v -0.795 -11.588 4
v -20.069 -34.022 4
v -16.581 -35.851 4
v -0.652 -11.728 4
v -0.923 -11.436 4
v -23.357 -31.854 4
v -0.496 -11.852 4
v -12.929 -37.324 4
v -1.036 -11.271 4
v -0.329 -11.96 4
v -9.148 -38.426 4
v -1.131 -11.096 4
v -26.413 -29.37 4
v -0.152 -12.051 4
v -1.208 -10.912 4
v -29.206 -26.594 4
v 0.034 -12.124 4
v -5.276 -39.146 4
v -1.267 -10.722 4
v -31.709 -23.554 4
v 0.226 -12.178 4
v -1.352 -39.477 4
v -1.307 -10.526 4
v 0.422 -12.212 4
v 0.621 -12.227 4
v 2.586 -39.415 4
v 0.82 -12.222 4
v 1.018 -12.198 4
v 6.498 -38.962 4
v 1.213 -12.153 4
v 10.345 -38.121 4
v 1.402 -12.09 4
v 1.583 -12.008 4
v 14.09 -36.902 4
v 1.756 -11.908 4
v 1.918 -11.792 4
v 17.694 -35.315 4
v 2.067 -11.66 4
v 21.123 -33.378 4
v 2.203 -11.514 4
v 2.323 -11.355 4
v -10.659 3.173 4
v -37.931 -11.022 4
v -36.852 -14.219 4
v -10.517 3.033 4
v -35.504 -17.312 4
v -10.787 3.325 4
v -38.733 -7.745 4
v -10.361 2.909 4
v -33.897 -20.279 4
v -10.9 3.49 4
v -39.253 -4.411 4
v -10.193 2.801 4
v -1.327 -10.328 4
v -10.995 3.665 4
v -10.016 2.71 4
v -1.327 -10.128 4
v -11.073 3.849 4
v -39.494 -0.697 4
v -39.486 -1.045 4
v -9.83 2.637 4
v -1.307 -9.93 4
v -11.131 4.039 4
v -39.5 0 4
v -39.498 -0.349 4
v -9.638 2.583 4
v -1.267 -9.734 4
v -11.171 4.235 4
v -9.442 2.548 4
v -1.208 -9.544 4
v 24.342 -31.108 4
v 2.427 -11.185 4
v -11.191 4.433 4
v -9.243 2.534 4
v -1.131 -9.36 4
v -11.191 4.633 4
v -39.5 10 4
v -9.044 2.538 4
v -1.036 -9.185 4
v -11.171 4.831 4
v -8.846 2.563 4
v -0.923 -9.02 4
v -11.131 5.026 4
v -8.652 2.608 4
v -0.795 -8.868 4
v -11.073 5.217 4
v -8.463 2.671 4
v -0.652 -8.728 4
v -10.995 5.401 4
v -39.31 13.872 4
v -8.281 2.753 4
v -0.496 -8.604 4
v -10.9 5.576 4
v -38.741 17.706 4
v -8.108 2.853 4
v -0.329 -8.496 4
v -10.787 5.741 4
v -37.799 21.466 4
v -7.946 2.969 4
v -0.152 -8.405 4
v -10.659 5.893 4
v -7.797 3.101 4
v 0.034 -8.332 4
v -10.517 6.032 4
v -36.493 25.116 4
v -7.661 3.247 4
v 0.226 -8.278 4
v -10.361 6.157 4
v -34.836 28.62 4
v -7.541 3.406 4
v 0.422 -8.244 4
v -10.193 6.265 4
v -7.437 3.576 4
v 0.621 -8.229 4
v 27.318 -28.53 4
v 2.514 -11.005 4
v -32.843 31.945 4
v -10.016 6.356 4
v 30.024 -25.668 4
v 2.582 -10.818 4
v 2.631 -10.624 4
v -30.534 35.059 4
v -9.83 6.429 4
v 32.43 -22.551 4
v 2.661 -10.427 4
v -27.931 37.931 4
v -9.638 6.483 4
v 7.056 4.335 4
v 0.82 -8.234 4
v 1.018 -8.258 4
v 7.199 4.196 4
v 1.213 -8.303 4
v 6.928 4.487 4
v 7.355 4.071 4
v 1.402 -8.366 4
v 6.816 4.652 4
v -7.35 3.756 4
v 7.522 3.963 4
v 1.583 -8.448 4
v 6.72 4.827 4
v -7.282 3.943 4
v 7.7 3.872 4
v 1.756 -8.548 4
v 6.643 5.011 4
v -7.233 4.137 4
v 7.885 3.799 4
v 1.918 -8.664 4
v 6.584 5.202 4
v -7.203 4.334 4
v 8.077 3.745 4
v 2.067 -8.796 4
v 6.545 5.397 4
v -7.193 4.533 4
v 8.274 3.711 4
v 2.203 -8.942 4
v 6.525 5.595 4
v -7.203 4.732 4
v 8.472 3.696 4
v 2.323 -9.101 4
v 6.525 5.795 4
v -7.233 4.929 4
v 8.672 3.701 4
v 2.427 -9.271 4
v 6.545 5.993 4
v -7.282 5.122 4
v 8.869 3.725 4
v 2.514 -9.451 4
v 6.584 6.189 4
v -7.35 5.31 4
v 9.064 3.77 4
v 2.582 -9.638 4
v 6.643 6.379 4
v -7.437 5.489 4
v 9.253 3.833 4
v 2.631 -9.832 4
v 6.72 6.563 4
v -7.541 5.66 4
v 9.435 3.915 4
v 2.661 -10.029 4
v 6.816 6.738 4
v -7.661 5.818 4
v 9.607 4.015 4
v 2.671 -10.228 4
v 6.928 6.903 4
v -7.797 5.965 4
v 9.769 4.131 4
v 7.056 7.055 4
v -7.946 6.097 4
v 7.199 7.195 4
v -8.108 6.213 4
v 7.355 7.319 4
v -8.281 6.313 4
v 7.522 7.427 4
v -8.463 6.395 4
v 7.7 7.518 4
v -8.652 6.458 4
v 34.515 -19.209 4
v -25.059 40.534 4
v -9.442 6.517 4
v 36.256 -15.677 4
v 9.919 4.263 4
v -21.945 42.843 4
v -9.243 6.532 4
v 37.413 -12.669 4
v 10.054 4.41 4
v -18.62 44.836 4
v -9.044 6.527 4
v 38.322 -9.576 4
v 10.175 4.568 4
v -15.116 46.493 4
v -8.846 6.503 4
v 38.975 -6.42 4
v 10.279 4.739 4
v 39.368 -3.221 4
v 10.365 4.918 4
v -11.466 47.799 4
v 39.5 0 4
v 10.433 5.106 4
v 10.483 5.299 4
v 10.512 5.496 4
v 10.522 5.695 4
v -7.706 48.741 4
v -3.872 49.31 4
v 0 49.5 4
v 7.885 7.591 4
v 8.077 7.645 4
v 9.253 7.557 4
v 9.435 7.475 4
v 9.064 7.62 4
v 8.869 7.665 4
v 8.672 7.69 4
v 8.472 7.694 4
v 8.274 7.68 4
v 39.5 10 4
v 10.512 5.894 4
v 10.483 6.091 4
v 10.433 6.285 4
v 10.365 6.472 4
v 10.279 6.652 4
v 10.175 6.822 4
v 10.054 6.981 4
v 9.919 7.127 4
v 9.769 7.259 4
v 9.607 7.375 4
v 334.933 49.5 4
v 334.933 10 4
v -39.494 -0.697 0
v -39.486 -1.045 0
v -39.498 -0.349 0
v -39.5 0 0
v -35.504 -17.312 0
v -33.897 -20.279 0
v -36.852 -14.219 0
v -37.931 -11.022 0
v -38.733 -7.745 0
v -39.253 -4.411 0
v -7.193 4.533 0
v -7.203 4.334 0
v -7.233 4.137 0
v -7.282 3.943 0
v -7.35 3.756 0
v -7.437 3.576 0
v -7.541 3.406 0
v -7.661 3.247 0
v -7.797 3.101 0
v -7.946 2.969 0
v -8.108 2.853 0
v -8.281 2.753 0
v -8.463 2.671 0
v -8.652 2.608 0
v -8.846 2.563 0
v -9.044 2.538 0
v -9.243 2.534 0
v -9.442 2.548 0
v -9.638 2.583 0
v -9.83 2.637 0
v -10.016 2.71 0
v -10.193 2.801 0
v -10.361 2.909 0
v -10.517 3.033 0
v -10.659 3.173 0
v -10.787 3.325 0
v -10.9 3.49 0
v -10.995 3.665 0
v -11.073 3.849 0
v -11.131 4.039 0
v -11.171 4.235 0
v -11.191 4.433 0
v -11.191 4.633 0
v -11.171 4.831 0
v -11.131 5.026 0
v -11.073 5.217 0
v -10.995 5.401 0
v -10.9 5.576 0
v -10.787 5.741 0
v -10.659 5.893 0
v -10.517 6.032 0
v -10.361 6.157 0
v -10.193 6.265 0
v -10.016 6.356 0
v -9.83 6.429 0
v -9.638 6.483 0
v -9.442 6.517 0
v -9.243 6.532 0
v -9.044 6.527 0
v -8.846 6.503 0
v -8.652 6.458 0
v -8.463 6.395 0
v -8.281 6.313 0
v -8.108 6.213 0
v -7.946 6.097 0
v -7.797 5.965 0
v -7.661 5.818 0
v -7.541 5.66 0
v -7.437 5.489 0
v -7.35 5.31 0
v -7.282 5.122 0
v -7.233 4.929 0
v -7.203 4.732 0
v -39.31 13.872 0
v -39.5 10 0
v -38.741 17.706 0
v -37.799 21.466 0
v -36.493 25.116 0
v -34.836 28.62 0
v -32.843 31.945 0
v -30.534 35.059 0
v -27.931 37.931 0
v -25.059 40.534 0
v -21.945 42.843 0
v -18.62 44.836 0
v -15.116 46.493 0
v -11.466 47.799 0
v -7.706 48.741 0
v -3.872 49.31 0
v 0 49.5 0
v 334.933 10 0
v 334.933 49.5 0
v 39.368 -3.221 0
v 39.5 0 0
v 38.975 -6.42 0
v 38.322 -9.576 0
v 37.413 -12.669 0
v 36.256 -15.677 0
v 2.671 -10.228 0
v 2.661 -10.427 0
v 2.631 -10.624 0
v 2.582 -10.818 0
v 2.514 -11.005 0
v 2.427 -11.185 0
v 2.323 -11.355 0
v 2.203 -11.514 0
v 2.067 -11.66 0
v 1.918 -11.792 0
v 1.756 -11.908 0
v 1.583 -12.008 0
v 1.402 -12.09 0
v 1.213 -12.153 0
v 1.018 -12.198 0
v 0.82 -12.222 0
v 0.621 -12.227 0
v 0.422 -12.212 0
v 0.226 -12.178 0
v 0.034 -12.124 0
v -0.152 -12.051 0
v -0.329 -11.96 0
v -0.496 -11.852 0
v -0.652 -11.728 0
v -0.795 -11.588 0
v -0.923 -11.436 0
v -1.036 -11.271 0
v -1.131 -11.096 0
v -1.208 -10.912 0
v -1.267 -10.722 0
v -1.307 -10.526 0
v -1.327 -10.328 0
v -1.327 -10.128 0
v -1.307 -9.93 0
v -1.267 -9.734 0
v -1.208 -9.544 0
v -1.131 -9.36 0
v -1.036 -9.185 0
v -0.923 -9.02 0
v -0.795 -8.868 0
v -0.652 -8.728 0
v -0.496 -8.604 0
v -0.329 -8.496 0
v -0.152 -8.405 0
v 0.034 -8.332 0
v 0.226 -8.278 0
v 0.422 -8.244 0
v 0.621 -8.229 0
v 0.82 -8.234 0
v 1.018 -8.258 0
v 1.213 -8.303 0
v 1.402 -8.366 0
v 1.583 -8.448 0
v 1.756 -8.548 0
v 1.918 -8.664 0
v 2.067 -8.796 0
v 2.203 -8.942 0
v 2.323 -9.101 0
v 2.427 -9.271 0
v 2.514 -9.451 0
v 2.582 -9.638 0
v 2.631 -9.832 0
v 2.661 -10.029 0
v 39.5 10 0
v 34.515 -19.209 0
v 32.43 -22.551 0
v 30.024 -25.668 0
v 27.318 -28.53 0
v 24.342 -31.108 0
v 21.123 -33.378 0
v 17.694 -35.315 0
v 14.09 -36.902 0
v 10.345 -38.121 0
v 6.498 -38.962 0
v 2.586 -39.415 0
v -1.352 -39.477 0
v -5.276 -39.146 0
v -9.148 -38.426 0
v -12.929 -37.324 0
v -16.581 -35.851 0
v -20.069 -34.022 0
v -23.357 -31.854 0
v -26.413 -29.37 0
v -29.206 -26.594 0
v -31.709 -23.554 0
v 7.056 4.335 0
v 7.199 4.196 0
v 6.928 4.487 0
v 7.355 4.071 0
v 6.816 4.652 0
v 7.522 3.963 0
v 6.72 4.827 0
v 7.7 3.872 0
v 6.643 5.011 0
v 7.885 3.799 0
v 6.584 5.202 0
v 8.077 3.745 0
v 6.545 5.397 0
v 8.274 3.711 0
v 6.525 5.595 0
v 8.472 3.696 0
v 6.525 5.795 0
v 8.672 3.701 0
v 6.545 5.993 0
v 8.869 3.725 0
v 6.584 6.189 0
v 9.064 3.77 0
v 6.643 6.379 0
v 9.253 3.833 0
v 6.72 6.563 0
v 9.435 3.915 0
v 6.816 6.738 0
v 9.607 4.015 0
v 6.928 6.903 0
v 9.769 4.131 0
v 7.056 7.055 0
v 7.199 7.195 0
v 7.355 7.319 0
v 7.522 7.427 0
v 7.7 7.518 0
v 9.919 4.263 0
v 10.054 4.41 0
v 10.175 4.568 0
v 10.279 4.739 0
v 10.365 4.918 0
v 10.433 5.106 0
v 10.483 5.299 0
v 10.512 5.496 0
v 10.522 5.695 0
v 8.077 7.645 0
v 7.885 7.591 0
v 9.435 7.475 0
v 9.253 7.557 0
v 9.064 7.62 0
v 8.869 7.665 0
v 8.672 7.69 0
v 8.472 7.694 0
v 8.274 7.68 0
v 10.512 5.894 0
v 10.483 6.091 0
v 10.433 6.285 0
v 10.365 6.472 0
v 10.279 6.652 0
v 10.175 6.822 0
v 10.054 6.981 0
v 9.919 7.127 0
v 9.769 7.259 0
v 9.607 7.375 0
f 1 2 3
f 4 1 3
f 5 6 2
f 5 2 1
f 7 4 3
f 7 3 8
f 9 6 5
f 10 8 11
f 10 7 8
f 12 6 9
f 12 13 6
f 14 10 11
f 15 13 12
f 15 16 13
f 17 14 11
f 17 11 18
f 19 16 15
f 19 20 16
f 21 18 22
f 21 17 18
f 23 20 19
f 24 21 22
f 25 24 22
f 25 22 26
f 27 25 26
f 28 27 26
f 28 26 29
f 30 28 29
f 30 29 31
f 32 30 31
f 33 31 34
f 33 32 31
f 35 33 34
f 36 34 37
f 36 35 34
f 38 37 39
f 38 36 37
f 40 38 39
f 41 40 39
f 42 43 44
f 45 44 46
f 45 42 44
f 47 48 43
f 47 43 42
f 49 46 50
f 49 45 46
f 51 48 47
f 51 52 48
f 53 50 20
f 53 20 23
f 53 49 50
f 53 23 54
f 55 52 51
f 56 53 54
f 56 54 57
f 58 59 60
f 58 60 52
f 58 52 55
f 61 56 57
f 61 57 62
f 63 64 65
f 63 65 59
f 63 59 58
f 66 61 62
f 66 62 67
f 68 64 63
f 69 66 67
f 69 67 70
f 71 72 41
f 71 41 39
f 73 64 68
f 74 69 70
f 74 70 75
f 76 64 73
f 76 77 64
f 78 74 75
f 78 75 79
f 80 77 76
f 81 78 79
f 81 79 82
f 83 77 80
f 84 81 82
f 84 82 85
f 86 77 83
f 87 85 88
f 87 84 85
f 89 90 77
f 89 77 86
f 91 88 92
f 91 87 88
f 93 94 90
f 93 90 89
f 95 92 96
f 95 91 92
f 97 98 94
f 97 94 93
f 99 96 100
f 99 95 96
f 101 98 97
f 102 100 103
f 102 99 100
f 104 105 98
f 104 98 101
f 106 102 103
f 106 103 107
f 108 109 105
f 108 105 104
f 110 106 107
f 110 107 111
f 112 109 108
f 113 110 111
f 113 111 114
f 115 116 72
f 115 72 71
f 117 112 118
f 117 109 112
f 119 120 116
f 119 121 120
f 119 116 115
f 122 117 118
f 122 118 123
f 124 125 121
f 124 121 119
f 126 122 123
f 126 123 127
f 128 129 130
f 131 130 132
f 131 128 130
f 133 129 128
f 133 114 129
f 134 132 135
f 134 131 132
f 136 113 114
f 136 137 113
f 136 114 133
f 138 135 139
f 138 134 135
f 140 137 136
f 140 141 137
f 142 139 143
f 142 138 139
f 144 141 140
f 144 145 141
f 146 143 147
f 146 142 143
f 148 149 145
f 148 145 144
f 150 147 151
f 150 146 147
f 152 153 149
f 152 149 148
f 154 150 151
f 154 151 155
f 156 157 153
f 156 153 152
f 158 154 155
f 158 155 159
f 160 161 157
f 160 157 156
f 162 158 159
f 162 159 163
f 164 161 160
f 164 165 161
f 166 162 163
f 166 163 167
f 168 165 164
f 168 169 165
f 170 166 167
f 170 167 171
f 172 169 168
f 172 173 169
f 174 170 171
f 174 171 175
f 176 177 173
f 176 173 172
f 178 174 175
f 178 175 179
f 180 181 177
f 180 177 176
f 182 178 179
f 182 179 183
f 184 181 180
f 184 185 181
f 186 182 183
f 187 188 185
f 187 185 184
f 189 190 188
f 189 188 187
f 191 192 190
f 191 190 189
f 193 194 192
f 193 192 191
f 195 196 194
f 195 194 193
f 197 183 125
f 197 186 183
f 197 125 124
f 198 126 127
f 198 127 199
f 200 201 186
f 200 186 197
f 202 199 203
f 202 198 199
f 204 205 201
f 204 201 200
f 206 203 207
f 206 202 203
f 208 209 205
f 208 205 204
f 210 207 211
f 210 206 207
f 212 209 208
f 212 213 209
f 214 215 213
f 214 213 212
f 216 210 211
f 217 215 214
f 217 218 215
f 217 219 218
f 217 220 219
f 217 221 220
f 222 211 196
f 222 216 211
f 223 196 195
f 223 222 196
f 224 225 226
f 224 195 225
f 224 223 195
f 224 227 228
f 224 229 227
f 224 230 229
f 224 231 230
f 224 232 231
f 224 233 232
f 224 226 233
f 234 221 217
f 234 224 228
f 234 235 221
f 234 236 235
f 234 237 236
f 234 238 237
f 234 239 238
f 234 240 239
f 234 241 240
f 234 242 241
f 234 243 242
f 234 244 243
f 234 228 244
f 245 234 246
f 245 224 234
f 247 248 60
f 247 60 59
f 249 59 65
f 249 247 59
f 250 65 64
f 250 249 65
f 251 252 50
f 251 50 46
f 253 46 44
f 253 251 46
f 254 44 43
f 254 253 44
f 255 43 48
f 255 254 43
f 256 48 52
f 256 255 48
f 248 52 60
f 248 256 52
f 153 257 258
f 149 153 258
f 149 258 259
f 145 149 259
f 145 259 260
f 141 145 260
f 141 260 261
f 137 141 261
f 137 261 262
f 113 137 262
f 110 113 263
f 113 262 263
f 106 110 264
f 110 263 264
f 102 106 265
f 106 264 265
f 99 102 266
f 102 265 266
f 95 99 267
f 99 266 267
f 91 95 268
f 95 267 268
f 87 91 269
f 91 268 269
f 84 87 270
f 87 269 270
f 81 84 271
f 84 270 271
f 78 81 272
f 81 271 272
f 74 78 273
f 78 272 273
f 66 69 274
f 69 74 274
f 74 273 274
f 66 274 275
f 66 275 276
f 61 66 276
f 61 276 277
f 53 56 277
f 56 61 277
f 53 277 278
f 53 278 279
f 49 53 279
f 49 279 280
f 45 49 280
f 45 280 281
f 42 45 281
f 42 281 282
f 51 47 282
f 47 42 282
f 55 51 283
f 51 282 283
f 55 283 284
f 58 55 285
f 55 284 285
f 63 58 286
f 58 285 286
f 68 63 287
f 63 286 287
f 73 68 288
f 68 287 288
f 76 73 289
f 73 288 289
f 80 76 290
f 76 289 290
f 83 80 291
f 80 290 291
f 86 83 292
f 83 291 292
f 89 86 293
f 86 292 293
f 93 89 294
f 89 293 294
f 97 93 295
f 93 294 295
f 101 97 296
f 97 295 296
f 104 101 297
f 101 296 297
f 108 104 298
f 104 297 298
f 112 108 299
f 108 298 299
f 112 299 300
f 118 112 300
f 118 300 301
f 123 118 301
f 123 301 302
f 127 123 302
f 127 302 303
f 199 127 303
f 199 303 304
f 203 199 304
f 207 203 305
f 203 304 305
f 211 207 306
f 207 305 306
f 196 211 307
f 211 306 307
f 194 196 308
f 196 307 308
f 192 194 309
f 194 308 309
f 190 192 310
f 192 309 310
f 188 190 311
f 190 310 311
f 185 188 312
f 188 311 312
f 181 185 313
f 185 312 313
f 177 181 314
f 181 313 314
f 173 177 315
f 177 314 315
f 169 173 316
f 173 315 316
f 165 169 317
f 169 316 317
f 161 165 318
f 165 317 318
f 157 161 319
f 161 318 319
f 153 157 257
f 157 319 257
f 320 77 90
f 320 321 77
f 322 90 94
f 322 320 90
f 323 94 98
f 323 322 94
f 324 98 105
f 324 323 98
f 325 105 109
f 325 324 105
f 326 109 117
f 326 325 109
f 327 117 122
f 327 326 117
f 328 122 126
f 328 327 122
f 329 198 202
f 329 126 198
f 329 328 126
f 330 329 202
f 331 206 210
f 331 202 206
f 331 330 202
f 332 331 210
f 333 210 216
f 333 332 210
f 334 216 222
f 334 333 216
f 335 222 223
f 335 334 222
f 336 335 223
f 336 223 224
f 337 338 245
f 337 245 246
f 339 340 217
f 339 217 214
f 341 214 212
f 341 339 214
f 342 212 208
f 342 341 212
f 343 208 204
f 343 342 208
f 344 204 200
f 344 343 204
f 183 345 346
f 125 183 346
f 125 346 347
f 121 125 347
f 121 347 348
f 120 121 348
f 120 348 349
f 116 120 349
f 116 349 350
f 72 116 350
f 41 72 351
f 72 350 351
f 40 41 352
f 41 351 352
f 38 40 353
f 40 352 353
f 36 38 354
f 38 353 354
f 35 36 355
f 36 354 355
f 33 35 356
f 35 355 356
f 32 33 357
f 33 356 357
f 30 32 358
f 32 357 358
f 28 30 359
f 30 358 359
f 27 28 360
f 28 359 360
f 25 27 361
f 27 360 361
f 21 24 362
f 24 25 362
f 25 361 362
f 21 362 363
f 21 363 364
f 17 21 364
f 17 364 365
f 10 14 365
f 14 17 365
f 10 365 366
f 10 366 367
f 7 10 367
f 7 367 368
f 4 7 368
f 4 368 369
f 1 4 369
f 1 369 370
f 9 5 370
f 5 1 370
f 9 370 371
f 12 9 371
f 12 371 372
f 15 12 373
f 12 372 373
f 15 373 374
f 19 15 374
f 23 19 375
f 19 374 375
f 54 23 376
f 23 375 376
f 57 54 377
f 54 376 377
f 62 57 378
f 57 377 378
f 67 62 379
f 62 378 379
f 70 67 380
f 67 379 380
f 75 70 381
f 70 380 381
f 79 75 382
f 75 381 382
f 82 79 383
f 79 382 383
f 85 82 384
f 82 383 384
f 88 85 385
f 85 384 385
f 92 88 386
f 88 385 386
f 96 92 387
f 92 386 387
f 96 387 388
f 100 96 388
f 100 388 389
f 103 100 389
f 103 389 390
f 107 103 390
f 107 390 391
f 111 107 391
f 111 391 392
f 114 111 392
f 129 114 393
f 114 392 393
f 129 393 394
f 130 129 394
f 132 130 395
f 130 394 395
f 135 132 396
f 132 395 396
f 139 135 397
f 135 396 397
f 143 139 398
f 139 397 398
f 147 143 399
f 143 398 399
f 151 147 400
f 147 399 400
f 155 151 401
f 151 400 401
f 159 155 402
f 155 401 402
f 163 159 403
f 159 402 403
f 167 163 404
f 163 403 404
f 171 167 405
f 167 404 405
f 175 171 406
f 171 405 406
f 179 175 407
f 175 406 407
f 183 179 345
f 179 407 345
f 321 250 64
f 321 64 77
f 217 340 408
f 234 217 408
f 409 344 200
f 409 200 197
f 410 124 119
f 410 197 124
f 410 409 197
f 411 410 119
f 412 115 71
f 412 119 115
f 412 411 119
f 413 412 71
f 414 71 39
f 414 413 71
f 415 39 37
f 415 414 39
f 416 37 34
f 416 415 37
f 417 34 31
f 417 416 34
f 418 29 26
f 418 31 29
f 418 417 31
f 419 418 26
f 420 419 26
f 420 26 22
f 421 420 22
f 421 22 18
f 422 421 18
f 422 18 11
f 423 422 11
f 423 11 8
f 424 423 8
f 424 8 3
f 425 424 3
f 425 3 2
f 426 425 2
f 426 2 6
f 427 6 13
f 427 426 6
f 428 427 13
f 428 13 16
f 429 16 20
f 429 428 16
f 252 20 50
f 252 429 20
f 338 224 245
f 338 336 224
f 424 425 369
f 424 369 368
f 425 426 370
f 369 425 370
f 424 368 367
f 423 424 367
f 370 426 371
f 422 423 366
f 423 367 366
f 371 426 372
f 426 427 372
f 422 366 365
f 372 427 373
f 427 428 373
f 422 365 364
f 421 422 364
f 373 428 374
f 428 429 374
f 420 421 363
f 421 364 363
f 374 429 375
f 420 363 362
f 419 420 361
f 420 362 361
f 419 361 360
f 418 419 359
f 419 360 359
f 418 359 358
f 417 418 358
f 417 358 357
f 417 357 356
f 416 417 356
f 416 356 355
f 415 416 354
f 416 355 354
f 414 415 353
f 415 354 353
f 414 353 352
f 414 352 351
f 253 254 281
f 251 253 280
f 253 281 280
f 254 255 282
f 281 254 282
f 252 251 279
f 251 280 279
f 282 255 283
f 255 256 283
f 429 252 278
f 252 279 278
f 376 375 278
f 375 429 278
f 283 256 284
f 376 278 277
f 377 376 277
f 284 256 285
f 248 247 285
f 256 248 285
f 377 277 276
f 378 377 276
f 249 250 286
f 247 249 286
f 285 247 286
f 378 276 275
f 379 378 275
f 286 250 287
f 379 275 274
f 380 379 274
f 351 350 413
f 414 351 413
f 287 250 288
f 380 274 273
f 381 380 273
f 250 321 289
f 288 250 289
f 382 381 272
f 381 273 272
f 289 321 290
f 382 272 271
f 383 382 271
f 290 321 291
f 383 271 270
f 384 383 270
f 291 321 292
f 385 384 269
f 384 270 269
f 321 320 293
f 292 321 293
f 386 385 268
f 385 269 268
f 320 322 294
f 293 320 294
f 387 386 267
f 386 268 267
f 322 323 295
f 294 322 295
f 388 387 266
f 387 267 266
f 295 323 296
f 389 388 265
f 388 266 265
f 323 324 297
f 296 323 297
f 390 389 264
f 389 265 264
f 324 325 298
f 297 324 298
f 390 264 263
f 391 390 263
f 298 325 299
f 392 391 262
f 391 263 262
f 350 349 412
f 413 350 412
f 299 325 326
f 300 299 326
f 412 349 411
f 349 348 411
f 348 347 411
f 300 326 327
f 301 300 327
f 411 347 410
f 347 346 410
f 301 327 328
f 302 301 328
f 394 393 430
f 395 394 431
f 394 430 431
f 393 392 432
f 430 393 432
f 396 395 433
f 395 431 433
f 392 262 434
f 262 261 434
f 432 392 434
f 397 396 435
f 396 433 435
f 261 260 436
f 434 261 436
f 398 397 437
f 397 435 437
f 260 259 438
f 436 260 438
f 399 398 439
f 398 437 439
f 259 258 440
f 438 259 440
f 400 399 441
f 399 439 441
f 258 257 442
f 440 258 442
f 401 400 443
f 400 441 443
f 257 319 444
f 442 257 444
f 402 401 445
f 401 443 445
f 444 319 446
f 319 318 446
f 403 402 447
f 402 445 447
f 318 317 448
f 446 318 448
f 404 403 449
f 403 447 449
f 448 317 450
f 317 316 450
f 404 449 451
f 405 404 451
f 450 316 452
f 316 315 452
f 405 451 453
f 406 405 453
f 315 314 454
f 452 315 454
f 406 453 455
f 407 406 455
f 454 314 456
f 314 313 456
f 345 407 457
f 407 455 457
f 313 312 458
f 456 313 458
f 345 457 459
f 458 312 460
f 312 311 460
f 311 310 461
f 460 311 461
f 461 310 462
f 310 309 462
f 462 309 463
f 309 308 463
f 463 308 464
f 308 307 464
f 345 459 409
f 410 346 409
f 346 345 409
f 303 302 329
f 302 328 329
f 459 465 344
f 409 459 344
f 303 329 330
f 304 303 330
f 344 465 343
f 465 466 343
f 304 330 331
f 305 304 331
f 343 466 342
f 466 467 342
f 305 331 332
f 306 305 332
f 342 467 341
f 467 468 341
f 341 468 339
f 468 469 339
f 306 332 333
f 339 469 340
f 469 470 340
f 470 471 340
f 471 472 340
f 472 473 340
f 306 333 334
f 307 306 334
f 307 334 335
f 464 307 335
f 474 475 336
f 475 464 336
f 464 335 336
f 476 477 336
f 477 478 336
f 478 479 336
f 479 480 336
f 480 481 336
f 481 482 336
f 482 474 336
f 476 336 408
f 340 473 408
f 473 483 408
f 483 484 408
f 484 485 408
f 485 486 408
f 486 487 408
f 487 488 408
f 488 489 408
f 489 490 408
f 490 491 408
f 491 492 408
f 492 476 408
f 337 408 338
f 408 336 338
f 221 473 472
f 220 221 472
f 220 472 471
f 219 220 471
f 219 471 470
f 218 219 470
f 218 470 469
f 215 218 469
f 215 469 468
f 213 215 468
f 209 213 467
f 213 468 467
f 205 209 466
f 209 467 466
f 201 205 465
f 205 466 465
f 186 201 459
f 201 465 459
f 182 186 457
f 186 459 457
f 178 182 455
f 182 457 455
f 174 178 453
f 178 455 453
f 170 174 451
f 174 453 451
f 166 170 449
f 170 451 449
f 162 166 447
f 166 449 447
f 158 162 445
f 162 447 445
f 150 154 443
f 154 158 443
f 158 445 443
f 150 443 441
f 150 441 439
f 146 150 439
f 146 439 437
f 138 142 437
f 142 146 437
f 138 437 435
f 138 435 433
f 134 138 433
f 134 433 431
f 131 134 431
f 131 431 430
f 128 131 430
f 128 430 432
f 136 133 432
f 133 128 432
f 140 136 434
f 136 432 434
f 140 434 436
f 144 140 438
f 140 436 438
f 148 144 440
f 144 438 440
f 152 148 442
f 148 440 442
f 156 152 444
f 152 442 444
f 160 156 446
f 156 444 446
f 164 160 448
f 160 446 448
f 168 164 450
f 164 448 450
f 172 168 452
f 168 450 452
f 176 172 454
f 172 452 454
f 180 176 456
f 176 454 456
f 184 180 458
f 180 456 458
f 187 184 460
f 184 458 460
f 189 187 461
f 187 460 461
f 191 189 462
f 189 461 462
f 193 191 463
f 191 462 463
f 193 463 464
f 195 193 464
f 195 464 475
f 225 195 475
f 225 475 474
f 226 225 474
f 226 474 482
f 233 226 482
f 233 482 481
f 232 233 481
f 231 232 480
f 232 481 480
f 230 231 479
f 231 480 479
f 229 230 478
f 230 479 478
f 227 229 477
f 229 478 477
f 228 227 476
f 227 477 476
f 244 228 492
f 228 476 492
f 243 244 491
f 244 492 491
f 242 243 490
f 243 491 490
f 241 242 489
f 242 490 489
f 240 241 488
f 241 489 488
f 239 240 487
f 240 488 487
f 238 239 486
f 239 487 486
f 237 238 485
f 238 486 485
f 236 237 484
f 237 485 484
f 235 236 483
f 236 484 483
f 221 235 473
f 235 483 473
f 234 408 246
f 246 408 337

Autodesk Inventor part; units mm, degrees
ref_plane "YZ Plane" through (0, 0, 0) normal (1, 0, 0) x (0, 1, 0)
ref_plane "XZ Plane" through (0, 0, 0) normal (0, 1, 0) x (-1, 0, 0)
ref_plane "XY Plane" through (0, 0, 0) normal (0, 0, 1) x (1, 0, 0)
sketch "Sketch1" plane through (0, 0, 0) normal (0, 0, 1) x (1, 0, 0)
  circle A0 centre (0, 0) radius 22.3333 projected
  circle A1 centre (8.5222, 5.6951) radius 2 projected
  circle A2 centre (0.671, -10.228) radius 2 projected
  circle A3 centre (-9.1932, 4.5329) radius 2 projected
  arc A4 (-33.8969, -20.2792) -> (36.2558, -15.6768) centre (0, 0) ccw projected
  arc A5 (39.2843, 4.1223) -> (-39.4862, -1.0454) centre (0, 0) ccw projected
  circle A6 centre (0, 0) radius 39.5
  line L0 (364.1325, 23.8889) -> (45.9013, 3.0114) projected
  line L1 (26.2679, 39.5) -> (334.9329, 39.5)
  line L2 (334.9329, 39.5) -> (334.9329, 0)
  line L3 (39.5, 10) -> (334.9329, 10)
  line L4 (334.9329, 10) -> (334.9329, 0)
  line L5 (334.9329, 39.5) -> (26.2679, 39.5)
  line L6 (0, 49.5) -> (334.9329, 49.5)
  line L7 (334.9329, 49.5) -> (334.9329, 39.5)
  arc A7 (39.1823, 5) -> (26.2679, 39.5) centre (0, 10) ccw
  arc A8 (0, 49.5) -> (-39.1823, 5) centre (0, 10) ccw
  line L8 (0, 0) -> (-39.5, 0)
  line L9 (-39.5, 0) -> (-39.5, 10)
  line L10 (39.5, 0) -> (39.5, 10)
  point P0 (0, 0)
  point P1 (-39.4862, -1.0454)
  point P2 (-33.8969, -20.2792)
  point P3 (36.2558, -15.6768)
extrude "Extrusion1" add sketch "Sketch1" along normal blind 4 contours A0 | A5 A6 A4 | L9 A8 A5 | A8 L6 L7 L1 A7 A5 | A7 L10 A6 A5 | A7 L1 L2 L0 L3 | L0 L2 L3
properties part number "lokiec"
